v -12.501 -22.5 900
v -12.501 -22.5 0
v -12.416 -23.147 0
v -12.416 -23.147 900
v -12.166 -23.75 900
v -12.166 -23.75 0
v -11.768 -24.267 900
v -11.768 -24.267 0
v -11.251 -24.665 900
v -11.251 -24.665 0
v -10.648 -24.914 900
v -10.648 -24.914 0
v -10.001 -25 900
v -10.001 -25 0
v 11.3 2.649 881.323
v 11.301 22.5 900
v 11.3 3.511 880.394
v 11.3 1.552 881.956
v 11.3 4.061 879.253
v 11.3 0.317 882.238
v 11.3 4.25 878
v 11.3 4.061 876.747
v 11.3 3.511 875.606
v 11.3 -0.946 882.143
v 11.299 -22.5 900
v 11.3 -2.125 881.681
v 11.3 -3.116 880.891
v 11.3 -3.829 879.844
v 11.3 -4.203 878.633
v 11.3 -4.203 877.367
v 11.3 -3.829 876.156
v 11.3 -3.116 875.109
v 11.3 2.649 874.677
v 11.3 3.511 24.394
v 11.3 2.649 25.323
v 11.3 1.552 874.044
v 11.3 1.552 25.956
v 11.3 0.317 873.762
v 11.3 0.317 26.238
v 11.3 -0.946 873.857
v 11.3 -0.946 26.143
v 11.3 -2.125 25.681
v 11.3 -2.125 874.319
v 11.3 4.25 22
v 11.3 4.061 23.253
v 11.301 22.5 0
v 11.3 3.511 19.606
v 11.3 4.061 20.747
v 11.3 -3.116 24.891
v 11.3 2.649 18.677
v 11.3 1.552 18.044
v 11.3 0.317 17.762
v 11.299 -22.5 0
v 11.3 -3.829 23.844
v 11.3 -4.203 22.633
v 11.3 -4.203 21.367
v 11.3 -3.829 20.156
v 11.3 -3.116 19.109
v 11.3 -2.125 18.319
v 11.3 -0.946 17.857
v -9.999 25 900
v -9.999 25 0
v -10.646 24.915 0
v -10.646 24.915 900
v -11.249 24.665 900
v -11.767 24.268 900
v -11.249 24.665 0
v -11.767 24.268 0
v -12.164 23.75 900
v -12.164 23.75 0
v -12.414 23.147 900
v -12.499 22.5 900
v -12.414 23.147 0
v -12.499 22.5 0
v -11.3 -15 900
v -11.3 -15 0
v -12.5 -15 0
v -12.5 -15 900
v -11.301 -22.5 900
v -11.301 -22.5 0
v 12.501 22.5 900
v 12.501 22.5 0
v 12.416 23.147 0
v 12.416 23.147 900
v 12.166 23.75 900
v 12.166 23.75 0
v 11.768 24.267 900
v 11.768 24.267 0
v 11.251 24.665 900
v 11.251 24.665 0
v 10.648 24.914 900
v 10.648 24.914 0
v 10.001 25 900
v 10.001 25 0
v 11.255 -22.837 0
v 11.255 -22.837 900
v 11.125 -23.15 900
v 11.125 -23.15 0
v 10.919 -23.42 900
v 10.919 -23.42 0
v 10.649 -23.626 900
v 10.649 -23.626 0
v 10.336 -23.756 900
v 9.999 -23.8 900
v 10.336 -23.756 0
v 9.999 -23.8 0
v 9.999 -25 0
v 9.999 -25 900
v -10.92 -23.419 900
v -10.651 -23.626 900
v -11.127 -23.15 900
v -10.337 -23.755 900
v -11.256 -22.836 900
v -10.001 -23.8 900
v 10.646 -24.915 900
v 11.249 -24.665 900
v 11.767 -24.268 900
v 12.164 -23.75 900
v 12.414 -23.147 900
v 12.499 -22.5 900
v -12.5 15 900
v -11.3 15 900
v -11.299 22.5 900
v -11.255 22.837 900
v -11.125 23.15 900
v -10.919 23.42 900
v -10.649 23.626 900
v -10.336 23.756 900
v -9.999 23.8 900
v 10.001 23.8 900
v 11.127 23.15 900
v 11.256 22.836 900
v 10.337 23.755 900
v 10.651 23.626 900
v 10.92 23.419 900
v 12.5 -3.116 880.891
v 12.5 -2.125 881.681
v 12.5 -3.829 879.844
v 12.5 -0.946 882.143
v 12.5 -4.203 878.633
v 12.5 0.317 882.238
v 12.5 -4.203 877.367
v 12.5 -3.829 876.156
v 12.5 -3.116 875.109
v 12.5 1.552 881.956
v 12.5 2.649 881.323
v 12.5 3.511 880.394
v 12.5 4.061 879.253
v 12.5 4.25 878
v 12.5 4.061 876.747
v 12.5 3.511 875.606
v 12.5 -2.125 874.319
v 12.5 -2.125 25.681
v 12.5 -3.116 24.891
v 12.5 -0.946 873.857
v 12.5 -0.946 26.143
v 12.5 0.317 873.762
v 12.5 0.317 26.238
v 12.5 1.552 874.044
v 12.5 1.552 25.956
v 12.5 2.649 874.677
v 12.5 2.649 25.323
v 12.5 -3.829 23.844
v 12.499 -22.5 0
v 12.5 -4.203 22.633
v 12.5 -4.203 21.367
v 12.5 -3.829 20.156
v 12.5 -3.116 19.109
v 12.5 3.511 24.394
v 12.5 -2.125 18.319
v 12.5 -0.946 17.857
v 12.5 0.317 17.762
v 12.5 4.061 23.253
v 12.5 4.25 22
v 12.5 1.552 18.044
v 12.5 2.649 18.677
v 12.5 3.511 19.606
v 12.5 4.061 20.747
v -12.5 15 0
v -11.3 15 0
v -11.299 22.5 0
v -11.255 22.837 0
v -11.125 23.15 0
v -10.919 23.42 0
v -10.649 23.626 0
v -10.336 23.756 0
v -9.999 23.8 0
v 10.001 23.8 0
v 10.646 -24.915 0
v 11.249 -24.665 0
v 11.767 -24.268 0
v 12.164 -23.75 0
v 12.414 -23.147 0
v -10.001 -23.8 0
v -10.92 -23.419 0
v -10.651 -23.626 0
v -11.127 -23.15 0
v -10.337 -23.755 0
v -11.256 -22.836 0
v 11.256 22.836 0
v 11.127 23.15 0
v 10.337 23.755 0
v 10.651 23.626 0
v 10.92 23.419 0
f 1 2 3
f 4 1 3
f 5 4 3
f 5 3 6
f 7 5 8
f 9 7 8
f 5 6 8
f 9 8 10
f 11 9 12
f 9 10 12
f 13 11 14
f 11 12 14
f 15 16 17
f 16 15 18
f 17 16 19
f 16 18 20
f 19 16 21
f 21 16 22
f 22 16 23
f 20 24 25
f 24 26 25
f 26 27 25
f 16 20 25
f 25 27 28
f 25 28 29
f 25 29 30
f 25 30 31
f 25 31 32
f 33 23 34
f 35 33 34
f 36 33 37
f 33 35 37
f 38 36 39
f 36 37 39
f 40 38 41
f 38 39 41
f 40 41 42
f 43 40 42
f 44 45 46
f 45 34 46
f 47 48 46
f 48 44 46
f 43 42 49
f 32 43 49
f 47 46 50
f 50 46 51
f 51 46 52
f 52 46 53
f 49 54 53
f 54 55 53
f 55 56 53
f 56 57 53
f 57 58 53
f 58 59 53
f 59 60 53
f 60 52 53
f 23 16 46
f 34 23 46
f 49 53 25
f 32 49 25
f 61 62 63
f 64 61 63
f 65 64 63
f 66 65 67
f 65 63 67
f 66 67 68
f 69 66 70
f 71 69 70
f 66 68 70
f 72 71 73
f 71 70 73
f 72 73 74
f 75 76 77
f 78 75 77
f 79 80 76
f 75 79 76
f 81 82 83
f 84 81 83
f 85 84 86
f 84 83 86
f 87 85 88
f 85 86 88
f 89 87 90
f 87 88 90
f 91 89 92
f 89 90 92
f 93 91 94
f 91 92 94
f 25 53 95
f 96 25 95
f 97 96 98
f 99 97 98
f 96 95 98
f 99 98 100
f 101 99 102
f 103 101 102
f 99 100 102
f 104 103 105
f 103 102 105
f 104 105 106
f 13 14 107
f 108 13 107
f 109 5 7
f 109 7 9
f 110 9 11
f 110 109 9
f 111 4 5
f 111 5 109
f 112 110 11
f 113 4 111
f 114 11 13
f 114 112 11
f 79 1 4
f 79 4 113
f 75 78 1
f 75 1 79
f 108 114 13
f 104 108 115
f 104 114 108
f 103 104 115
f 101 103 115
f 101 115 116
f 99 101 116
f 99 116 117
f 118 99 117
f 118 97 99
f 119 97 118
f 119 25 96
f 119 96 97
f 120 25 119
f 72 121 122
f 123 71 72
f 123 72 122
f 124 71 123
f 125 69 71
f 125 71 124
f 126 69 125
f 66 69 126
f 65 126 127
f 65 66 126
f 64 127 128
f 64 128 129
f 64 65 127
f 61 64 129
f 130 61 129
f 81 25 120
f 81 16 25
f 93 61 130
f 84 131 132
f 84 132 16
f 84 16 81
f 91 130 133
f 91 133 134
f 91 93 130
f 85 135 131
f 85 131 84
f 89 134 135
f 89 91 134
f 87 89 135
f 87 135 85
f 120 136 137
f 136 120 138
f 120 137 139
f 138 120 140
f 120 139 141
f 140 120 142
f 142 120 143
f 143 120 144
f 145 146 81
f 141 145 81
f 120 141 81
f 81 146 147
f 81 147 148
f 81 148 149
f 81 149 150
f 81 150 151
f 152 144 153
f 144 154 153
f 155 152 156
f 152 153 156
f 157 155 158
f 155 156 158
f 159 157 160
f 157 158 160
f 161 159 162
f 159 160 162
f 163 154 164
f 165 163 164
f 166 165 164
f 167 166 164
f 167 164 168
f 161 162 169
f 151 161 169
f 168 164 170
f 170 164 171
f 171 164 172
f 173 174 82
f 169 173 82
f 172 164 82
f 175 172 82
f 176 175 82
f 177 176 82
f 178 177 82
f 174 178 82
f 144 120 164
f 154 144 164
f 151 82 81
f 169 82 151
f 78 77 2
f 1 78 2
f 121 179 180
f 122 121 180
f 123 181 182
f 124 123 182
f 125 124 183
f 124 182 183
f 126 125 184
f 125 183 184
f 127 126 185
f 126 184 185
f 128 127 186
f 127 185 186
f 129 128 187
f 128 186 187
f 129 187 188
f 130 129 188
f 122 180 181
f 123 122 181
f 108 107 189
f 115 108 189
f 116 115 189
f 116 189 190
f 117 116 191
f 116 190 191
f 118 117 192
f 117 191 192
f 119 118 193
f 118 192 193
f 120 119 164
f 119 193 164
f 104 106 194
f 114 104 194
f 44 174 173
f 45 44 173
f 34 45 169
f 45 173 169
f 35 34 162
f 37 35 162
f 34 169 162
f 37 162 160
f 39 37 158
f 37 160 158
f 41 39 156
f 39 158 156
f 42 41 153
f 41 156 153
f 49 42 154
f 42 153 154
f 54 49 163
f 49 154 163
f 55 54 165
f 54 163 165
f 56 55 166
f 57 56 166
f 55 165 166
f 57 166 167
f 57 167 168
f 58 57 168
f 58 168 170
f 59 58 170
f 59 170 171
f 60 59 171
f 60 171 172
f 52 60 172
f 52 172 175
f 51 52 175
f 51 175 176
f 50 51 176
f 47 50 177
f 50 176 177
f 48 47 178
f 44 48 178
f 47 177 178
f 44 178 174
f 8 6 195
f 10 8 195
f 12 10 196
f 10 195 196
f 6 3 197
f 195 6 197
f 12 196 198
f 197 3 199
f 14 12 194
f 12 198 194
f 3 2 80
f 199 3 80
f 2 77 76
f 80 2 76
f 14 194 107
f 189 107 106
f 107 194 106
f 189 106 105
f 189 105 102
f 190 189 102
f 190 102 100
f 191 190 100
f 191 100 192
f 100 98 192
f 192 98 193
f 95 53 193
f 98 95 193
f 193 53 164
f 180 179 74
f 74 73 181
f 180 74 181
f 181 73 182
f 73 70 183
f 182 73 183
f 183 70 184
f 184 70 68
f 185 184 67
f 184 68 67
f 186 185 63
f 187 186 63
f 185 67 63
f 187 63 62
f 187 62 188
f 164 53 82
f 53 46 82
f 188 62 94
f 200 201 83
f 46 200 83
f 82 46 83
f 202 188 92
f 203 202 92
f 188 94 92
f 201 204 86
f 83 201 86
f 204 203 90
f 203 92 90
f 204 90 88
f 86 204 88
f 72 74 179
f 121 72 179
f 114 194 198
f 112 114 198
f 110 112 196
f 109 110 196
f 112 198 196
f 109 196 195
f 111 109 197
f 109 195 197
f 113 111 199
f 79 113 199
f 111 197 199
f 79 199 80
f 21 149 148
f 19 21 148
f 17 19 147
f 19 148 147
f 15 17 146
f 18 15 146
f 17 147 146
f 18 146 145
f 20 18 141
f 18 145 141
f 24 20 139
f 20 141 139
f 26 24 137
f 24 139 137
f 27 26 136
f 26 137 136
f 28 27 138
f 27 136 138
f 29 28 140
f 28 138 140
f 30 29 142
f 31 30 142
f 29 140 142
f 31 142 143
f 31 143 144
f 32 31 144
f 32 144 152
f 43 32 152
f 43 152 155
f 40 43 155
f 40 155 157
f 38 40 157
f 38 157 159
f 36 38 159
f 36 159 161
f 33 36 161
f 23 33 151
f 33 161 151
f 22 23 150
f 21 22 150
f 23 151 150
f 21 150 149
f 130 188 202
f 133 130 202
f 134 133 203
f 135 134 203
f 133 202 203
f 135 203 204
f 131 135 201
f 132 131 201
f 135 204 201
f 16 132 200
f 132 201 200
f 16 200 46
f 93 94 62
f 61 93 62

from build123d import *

# Parameters (mm, degrees)
F2_DEPTH = 900
F3_R     = 4.25
F4_DEPTH = 1.2000000005


with BuildPart() as f2:
    # F0 (on Top) → F2 (new body)
    with BuildSketch(Plane.XY):
        with BuildLine():
            ThreePointArc((12.5006749989, 22.499625), (11.7684949852, 24.2674139192), (10.00075, 24.9996999989))
            Line((10.00075, 24.9997), (-9.99925, 25.000299))
            ThreePointArc((-9.99925, 25.0002989989), (-11.7670389192, 24.2681189852), (-12.4993249989, 22.500374))
            Line((-12.499325, 22.500374), (-12.49955, 15.000374))
            Line((-12.49955, 15.000374), (-11.29955, 15.000338))
            Line((-11.29955, 15.000338), (-11.299325, 22.500338))
            ThreePointArc((-11.2993249994, 22.500338), (-10.918536238, 23.4195653923), (-9.999286, 23.8002989994))
            Line((-9.999286, 23.800299), (10.000714, 23.7997))
            ThreePointArc((10.000714, 23.7996999994), (10.9199413923, 23.418911238), (11.3006749994, 22.499661))
            Line((11.300675, 22.499661), (11.299326, -22.500339))
            ThreePointArc((11.2993259994, -22.500339), (10.918537238, -23.4195663923), (9.999287, -23.8002999994))
            Line((9.999287, -23.8003), (-10.000713, -23.799701))
            ThreePointArc((-10.000713, -23.7997009994), (-10.9199403923, -23.418912238), (-11.3006739994, -22.499662))
            Line((-11.300674, -22.499662), (-11.30045, -14.999662))
            Line((-11.30045, -14.999662), (-12.50045, -14.999626))
            Line((-12.50045, -14.999626), (-12.500674, -22.499626))
            ThreePointArc((-12.5006739989, -22.499626), (-11.7684939852, -24.2674149192), (-10.000749, -24.9997009989))
            Line((-10.000749, -24.999701), (9.999251, -25.0003))
            ThreePointArc((9.999251, -25.0002999989), (11.7670399192, -24.2681199852), (12.4993259989, -22.500375))
            Line((12.499326, -22.500375), (12.500675, 22.499625))
        make_face()
    extrude(amount=F2_DEPTH)

    # F3 (on face) → F4 (cut, through all)
    with BuildSketch(Plane(origin=(12.5000005, -0.0003747222, 0), x_dir=(2.99778e-05, 0.9999999996, 0), z_dir=(0.9999999996, -2.99778e-05, 0))):
        with Locations((0, 22)):
            Circle(F3_R)
        with Locations((0, 878)):
            Circle(F3_R)
    extrude(amount=-F4_DEPTH, mode=Mode.SUBTRACT)


solid = f2.part
